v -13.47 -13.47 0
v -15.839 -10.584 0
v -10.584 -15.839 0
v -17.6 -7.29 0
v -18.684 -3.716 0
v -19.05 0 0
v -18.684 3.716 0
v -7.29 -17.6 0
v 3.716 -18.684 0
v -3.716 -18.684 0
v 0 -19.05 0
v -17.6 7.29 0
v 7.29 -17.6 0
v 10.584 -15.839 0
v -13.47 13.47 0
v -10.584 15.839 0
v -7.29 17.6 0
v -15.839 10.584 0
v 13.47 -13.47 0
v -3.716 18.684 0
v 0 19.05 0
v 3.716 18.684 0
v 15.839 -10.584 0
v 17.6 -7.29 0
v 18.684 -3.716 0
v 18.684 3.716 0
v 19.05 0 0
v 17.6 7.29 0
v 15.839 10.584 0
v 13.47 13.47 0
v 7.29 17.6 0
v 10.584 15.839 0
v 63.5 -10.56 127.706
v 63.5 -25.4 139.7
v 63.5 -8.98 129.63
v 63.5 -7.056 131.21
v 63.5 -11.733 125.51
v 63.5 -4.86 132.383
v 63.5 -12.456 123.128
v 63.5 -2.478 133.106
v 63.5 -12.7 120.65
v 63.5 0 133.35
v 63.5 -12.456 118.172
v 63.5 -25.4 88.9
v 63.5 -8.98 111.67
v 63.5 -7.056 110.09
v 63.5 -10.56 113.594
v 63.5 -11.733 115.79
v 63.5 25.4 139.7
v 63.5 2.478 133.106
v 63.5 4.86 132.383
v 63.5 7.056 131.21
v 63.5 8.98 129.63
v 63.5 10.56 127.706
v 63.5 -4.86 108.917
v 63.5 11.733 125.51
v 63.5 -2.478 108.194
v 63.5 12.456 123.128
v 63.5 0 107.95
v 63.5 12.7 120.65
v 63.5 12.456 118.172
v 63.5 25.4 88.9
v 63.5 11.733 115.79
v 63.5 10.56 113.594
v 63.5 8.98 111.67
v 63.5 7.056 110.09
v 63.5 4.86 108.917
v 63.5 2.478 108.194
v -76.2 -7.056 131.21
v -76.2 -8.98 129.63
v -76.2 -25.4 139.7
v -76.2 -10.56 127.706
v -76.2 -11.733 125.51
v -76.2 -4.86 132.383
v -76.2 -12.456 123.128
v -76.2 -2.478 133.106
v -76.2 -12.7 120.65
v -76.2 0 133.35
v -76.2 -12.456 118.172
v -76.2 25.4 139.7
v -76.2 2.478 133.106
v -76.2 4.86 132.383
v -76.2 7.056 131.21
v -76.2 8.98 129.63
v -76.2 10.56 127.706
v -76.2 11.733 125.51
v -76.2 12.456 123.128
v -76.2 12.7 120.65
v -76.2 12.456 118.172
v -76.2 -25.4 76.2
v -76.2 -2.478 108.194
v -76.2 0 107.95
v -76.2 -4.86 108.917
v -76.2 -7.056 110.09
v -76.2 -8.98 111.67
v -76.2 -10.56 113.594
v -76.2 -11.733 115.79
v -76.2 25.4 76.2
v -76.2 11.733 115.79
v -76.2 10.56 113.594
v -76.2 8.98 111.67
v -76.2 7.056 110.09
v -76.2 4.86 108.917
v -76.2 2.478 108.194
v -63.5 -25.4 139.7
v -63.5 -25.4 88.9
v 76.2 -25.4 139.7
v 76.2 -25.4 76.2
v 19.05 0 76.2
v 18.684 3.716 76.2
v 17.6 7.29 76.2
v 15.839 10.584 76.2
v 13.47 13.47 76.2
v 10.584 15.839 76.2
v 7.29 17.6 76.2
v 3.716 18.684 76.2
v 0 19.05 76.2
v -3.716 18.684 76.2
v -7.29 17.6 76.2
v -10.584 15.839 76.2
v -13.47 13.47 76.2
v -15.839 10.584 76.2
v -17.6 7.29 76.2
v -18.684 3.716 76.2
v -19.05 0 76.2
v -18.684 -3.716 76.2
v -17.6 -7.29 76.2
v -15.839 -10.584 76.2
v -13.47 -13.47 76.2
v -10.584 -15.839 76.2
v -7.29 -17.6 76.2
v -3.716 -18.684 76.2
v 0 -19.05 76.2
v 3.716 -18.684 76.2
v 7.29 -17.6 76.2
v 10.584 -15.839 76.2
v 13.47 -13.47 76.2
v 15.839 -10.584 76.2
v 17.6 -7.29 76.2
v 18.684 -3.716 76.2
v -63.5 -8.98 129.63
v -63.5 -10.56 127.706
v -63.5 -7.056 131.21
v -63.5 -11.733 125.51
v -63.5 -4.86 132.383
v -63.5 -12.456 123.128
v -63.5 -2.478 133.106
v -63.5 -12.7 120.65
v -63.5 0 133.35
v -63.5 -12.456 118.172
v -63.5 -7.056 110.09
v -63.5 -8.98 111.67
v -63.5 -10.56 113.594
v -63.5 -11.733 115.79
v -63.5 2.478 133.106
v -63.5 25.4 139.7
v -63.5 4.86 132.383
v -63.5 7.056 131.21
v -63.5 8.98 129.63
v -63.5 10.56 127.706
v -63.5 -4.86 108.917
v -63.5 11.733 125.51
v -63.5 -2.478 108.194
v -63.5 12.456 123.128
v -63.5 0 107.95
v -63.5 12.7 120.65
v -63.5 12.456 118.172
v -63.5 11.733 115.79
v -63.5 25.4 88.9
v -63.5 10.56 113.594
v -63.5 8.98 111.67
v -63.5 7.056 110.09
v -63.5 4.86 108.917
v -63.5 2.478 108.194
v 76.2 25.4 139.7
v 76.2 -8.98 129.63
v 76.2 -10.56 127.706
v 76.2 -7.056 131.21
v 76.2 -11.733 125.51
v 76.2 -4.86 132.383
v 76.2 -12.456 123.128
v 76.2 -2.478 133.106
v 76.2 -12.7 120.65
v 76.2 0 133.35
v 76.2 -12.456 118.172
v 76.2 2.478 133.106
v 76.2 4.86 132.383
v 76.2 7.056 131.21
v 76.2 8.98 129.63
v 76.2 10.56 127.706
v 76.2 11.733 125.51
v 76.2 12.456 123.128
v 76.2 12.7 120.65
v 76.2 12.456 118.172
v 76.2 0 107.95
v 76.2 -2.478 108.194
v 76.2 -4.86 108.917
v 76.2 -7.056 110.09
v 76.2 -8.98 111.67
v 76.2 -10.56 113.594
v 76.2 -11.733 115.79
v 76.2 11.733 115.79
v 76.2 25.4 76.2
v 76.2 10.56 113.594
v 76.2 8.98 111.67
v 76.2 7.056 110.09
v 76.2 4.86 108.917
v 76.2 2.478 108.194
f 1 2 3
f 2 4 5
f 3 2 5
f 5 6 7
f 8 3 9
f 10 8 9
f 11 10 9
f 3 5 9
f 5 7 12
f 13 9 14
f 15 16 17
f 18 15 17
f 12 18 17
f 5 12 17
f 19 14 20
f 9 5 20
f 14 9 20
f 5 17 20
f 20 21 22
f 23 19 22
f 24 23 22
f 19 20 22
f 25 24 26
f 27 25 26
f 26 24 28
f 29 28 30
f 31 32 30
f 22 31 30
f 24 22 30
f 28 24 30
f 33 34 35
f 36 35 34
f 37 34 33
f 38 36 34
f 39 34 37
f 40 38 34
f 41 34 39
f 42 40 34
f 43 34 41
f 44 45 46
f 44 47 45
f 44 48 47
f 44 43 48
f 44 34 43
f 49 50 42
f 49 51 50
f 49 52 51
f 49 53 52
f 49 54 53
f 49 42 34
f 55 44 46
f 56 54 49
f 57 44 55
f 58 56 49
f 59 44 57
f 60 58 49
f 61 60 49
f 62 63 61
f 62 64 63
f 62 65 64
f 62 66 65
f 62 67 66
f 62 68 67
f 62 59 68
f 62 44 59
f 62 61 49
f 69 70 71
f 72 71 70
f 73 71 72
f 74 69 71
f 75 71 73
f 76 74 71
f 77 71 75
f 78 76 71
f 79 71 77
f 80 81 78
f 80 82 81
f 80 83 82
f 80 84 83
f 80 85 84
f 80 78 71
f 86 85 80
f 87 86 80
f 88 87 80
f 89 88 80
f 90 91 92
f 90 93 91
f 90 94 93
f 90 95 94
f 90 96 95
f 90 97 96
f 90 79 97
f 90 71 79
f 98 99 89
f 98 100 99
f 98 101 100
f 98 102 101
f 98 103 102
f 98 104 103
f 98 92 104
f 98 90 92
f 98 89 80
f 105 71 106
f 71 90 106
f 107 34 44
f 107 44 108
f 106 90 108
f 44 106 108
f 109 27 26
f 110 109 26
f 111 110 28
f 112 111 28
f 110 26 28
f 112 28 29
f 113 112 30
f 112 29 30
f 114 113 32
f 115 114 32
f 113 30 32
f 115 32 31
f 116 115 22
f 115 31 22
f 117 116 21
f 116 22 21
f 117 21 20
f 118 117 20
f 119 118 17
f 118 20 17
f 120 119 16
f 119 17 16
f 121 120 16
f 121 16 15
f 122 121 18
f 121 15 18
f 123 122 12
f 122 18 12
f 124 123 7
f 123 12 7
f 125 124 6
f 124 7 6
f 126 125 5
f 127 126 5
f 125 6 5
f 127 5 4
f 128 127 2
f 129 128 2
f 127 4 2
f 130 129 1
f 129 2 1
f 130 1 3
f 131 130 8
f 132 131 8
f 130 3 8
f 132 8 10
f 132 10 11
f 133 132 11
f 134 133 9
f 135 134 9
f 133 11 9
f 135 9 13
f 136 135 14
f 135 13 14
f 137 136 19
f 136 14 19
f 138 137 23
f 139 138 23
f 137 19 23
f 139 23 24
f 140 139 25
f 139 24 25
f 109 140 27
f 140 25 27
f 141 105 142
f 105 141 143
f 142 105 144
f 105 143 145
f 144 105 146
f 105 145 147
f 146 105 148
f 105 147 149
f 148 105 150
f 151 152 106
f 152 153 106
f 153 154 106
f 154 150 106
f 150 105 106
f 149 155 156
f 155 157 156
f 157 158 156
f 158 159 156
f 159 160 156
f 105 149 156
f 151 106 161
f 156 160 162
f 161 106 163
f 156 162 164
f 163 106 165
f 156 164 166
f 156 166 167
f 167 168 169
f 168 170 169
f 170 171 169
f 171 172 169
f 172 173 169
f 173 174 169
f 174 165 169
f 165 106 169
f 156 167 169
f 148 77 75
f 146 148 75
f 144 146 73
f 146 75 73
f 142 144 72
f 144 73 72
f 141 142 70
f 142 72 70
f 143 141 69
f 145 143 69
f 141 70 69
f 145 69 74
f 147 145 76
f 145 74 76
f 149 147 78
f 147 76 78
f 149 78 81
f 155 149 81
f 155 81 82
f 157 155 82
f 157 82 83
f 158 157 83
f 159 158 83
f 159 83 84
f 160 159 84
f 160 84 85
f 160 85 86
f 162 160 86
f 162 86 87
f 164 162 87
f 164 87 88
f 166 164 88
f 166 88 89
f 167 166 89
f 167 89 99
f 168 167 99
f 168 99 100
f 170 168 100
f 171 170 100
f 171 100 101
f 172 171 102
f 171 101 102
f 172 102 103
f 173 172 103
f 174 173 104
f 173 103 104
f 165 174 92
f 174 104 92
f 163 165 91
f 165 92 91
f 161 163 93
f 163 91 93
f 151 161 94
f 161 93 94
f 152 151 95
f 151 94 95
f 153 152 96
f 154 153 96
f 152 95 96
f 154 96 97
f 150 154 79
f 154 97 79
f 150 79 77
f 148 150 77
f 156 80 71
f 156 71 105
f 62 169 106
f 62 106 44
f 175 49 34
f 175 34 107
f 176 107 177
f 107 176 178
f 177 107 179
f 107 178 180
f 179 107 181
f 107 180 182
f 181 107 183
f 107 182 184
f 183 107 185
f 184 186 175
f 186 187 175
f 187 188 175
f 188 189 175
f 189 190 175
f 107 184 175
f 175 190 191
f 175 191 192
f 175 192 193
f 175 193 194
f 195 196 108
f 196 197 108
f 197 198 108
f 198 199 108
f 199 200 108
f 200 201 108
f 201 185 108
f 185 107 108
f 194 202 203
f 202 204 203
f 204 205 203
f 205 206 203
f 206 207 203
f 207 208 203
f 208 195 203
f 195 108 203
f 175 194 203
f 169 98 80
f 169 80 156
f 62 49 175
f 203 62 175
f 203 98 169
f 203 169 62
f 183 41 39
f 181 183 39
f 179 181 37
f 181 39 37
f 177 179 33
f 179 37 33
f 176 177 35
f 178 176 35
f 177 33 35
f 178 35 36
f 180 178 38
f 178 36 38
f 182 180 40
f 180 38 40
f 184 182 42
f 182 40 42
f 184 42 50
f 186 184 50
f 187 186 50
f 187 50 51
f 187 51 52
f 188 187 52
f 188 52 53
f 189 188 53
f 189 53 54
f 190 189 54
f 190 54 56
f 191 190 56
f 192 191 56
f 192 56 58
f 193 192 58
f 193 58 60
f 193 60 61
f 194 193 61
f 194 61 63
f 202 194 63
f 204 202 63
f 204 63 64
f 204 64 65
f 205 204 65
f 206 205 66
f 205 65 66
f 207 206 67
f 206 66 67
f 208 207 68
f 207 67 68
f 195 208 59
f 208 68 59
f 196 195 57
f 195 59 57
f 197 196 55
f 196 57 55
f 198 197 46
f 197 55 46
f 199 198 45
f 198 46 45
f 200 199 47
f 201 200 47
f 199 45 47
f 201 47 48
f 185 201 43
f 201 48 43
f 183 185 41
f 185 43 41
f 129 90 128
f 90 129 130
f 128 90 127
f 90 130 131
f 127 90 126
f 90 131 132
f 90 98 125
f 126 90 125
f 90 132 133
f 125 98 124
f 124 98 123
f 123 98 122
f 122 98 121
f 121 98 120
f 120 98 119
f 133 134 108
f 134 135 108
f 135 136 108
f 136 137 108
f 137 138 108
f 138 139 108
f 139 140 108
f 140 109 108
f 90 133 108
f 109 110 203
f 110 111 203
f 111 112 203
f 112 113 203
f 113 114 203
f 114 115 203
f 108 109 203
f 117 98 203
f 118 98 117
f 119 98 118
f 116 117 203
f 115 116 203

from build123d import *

# Parameters (mm, degrees)
F0_R     = 19.05
F1_DEPTH = 76.2
F2_W     = 152.4
F2_H     = 50.8
F2_R     = 19.05
F3_DEPTH = 12.7
F4_W     = 12.7
F4_H     = 50.8
F5_DEPTH = 50.8
F6_R     = 12.7
F7_DEPTH = 304.8


with BuildPart() as f1:
    # F0 (on Top) → F1 (new body)
    with BuildSketch(Plane.XY):
        Circle(F0_R)
    extrude(amount=F1_DEPTH)

    # F2 (on face) → F3 (join)
    with BuildSketch(Plane.XY.offset(76.2)):
        Rectangle(F2_W, F2_H)
        Circle(F2_R, mode=Mode.SUBTRACT)
        Circle(F2_R)
    extrude(amount=F3_DEPTH)

    # F4 (on face) → F5 (join)
    with BuildSketch(Plane.XY.offset(88.9)):
        with Locations((-69.85, 0)):
            Rectangle(F4_W, F4_H)
        with Locations((69.85, 0)):
            Rectangle(F4_W, F4_H)
    extrude(amount=F5_DEPTH)

    # F6 (on face) → F7 (cut)
    with BuildSketch(Plane(origin=(-76.2, 0, 0), x_dir=(0, -1, 0), z_dir=(-1, 0, 0))):
        with Locations((0, 120.65)):
            Circle(F6_R)
    extrude(amount=-F7_DEPTH, mode=Mode.SUBTRACT)


solid = f1.part
